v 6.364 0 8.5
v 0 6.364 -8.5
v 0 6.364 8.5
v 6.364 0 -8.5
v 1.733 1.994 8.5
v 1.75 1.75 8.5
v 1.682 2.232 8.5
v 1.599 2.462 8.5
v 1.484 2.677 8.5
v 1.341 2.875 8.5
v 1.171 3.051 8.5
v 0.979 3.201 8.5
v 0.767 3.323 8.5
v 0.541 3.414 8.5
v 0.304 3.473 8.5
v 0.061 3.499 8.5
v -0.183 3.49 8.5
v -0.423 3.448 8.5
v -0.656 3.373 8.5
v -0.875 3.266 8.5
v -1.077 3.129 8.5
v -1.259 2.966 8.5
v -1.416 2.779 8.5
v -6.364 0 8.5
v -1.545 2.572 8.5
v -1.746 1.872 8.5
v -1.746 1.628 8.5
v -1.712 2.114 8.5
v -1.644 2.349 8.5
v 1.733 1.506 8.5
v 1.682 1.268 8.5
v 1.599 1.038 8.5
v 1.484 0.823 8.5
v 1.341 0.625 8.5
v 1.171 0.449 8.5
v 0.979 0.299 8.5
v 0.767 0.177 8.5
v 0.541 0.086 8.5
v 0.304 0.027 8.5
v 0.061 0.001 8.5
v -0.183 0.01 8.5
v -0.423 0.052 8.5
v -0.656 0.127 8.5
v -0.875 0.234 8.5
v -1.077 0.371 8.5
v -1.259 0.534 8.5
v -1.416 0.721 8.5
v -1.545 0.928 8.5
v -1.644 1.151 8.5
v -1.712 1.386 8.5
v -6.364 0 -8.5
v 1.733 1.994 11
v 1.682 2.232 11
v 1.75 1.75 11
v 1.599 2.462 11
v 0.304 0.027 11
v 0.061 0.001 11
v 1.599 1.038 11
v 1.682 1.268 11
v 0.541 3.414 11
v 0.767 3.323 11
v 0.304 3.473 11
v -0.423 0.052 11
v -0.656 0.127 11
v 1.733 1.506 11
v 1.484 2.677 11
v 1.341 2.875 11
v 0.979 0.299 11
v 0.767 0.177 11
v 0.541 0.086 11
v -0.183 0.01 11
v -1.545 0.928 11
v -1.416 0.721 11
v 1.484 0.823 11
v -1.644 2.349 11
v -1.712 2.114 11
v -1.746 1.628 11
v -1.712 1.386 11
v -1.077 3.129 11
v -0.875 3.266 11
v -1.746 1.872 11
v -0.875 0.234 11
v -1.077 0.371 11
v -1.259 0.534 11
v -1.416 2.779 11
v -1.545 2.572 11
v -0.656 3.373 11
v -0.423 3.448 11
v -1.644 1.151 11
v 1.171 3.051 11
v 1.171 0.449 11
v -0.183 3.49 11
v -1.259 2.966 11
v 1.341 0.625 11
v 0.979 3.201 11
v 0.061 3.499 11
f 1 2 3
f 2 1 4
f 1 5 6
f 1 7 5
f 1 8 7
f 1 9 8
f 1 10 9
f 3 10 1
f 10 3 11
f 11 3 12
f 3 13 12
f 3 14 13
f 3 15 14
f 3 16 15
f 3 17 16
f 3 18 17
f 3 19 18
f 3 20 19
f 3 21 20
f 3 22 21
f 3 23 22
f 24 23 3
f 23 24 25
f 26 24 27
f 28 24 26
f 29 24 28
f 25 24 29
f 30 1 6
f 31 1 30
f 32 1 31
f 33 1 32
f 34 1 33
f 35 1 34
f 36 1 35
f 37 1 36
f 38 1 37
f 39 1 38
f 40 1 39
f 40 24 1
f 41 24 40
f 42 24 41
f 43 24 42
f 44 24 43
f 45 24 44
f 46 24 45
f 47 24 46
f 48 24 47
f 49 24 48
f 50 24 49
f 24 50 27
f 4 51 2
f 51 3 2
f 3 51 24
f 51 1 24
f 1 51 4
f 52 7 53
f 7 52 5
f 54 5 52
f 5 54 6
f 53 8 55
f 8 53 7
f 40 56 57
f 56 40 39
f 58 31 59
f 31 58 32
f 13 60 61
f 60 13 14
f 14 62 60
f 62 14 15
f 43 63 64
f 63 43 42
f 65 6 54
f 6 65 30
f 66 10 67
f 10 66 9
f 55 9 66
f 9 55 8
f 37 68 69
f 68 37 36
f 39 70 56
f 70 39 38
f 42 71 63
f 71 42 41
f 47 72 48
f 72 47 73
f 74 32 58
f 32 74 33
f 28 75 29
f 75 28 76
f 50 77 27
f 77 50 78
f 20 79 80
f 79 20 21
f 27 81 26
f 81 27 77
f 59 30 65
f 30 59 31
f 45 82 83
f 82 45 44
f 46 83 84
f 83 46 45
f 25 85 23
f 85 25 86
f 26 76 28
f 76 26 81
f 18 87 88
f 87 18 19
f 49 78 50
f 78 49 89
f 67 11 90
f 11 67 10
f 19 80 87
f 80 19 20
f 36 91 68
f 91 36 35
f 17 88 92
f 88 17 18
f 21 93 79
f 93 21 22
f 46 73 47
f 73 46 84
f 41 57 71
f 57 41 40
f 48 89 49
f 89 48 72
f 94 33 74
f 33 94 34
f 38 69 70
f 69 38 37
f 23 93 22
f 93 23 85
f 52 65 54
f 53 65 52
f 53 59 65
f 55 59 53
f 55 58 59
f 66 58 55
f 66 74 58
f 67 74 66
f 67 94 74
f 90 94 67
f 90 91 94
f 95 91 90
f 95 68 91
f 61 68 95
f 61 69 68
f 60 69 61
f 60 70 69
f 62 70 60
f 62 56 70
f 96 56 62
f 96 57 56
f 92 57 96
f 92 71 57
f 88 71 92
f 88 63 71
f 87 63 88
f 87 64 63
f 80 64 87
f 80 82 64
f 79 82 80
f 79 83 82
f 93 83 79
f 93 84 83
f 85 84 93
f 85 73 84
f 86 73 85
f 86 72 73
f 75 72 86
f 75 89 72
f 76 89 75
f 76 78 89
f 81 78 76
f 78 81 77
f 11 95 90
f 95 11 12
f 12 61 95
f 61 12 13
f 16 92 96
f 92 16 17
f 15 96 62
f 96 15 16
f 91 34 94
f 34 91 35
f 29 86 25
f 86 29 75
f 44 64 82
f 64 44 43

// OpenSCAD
$fn = 45;
pegHeight = 17;
pegShortSide = 9;
pegLongSide = sqrt(pegShortSide * pegShortSide * 2);
pinDiameter = 3.5;
mountThickness = 2.5;
mountWidth = 15;
mountHeight = 50;

// Part 1
module mountingPeg() {
    rotate([0, 0, 45]) difference() {
        cube([pegShortSide, pegShortSide, pegHeight], center=true);
        rotate([0, 0, 45]) translate([-(pegLongSide / 4), 0, 0])
          cube([pegLongSide / 2, 20, pegHeight], center = true);
    }
    translate([0, pinDiameter / 2, (pegHeight / 2) + (mountThickness / 2)]) 
      cylinder(d=pinDiameter, h=mountThickness, center = true);
};

// Part 2
module piMount() {
    difference() {
        cube([mountWidth, mountWidth, mountThickness], center = true);
        cylinder(d=pinDiameter + 0.5, h=mountThickness, center = true);
    }
    translate([0, (mountWidth / 2) - (mountThickness / 2), (mountThickness / 2) + (mountHeight / 2)]) 
        cube([mountWidth, mountThickness, mountHeight], center = true);
};

// The whole thing, exploded
module piMount() {
    translate([0, 0, -pegHeight / 2]) mountingPeg();
    translate([0, 3.2, 1 + (mountThickness / 2)]) piMount();
};

mountingPeg();
